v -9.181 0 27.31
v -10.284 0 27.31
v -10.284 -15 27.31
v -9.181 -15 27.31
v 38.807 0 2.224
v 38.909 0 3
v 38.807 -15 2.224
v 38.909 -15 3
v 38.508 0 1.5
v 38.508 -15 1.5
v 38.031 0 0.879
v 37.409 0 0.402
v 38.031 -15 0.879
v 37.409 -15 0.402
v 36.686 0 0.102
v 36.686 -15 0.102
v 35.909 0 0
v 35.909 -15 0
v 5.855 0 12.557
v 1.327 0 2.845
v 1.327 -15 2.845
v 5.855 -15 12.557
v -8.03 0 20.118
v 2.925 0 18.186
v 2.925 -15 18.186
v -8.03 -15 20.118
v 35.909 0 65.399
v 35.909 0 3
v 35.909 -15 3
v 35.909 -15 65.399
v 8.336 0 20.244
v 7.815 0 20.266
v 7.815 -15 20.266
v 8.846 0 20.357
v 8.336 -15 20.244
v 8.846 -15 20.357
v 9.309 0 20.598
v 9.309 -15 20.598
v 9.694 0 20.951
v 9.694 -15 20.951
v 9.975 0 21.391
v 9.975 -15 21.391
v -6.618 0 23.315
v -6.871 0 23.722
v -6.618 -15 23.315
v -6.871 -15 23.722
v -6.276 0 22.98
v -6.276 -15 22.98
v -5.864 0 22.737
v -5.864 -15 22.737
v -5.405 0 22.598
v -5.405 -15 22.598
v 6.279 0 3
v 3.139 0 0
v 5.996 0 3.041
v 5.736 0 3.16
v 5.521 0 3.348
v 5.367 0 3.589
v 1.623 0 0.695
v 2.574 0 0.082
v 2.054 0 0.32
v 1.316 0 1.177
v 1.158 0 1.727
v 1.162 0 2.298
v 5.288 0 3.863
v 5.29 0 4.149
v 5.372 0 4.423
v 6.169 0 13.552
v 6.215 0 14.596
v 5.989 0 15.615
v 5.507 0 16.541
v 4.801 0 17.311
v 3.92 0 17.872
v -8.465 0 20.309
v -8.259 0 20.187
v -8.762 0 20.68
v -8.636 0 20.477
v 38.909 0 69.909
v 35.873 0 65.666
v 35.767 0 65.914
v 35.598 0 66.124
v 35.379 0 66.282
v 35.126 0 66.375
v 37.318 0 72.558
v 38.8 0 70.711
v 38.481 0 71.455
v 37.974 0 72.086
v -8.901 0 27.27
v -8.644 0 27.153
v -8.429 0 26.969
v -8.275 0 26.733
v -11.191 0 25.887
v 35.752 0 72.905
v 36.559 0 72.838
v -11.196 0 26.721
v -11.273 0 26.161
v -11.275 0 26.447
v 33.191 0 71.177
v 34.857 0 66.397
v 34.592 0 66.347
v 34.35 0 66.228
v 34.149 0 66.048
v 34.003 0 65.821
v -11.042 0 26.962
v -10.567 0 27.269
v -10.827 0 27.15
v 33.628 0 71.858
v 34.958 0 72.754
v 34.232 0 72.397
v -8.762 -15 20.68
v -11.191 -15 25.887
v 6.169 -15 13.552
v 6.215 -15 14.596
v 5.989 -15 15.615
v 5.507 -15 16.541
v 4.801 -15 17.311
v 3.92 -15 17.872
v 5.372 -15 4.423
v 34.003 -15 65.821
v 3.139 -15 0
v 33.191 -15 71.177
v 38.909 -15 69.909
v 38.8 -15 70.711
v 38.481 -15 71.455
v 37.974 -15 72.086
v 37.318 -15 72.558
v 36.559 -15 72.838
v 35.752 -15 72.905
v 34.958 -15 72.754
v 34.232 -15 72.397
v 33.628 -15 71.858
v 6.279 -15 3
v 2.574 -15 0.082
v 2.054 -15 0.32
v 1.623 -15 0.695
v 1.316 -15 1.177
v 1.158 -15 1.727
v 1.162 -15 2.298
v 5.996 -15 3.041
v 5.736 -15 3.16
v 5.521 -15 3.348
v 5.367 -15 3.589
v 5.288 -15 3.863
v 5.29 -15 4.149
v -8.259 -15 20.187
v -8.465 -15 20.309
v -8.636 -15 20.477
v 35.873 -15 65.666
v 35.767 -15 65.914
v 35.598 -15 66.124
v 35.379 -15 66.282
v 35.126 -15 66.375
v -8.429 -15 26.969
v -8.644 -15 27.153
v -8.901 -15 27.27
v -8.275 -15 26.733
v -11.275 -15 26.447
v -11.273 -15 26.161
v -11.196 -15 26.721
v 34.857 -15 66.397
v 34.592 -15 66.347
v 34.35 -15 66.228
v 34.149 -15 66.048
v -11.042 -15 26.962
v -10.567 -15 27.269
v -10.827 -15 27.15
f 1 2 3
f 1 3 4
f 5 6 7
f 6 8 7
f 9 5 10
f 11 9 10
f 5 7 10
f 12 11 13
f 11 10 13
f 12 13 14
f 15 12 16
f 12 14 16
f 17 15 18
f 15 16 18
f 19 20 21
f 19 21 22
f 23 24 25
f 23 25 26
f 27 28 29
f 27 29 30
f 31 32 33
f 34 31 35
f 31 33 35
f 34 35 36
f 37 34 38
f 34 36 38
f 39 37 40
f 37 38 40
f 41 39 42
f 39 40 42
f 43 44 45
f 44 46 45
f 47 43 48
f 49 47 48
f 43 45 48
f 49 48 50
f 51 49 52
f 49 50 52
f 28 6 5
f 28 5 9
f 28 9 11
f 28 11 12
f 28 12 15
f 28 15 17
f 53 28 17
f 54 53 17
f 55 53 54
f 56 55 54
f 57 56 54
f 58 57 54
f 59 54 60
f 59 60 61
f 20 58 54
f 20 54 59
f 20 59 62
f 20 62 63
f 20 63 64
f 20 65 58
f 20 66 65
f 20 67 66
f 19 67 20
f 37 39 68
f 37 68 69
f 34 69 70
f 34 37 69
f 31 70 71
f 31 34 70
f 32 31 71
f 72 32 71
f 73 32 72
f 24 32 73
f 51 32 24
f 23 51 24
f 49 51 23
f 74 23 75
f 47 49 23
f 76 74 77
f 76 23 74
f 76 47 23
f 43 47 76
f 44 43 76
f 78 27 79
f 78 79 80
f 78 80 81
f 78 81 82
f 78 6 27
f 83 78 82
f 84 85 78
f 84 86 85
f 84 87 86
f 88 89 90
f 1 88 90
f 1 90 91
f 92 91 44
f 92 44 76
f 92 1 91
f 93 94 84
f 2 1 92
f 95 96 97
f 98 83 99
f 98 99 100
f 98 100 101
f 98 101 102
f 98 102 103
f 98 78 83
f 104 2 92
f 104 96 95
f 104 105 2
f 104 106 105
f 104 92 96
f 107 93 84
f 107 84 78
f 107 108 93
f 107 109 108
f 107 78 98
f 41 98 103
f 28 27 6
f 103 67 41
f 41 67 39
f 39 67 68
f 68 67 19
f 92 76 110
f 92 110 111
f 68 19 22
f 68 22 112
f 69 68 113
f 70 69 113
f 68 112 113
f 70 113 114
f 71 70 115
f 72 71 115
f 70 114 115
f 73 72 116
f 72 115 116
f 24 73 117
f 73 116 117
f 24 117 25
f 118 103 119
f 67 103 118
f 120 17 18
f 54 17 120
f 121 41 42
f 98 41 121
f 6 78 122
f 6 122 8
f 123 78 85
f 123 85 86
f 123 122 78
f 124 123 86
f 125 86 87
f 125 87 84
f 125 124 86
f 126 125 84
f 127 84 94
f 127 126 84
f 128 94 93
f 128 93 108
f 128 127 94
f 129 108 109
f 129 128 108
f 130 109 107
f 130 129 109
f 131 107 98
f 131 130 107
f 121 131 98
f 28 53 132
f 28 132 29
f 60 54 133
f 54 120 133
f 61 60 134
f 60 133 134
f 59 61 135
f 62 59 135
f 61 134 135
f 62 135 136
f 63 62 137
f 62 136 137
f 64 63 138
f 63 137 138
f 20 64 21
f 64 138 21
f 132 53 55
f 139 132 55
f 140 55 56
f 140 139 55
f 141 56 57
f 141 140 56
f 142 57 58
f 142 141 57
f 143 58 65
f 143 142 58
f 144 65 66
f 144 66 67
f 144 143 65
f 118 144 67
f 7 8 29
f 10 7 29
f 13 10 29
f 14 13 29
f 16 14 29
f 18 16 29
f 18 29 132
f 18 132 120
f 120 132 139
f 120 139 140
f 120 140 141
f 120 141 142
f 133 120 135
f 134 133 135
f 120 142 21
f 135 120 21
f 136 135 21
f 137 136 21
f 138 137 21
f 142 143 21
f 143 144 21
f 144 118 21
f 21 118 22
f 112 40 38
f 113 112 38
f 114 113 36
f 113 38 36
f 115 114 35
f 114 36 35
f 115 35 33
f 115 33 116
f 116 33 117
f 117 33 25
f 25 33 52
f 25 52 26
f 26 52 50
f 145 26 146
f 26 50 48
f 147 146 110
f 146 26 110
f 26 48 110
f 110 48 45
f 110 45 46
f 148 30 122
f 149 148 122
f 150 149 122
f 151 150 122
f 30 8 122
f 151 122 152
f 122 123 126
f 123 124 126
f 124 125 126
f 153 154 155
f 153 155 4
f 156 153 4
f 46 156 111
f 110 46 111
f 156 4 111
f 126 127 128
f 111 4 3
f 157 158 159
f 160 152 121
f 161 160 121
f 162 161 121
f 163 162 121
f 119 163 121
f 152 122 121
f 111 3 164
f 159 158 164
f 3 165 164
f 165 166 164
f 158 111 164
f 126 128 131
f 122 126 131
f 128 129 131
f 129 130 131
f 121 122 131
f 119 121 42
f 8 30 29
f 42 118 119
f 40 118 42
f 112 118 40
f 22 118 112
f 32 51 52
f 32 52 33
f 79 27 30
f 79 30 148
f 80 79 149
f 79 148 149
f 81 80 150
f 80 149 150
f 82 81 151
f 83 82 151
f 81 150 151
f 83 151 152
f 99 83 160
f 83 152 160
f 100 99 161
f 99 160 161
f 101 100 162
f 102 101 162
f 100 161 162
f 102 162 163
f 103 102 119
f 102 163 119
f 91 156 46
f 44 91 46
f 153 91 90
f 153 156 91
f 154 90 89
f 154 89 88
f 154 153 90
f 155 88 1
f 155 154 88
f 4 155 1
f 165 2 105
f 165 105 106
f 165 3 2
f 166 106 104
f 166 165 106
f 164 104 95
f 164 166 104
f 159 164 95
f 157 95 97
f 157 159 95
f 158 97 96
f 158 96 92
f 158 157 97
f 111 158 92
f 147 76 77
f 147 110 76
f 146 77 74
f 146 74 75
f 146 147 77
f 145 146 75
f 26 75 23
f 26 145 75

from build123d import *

# Parameters (mm, degrees)
PAD_DEPTH   = 15
FILLET_R    = 3
FILLET001_R = 2
FILLET002_R = 3
FILLET003_R = 1
FILLET004_R = 1
FILLET005_R = 4
FILLET006_R = 2
FILLET007_R = 1


with BuildPart() as part:
    # Sketch → Pad (new body)
    with BuildSketch(Plane.XZ):
        Polygon((38.909431, 83.441545), (38.909431, 0), (0, 0), (8.058298, 17.281077), (-8.54243, 20.208233), (-11.853996, 27.30991), (-8.543862, 27.30991), (-6.430771, 22.778371), (9.326153, 20), align=None)
        Polygon((35.909431, 69.90942), (4.709057, 3), (35.909431, 3), align=None, mode=Mode.SUBTRACT)
    extrude(amount=PAD_DEPTH)

    # Fillet
    fillet_edges = [part.edges().sort_by_distance(p)[0] for p in [
        (38.909431, -7.5, 0),
    ]]
    fillet(fillet_edges, radius=FILLET_R)

    # Fillet001
    fillet001_edges = [part.edges().sort_by_distance(p)[0] for p in [
        (0, -7.5, 0),
    ]]
    fillet(fillet001_edges, radius=FILLET001_R)

    # Fillet002
    fillet002_edges = [part.edges().sort_by_distance(p)[0] for p in [
        (38.909431, -7.5, 83.441545),
    ]]
    fillet(fillet002_edges, radius=FILLET002_R)

    # Fillet003
    fillet003_edges = [part.edges().sort_by_distance(p)[0] for p in [
        (35.909431, -7.5, 69.90942),
    ]]
    fillet(fillet003_edges, radius=FILLET003_R)

    # Fillet004
    fillet004_edges = [part.edges().sort_by_distance(p)[0] for p in [
        (4.709057, -7.5, 3),
    ]]
    fillet(fillet004_edges, radius=FILLET004_R)

    # Fillet005
    fillet005_edges = [part.edges().sort_by_distance(p)[0] for p in [
        (8.058298, -7.5, 17.281077),
    ]]
    fillet(fillet005_edges, radius=FILLET005_R)

    # Fillet006
    fillet006_edges = [part.edges().sort_by_distance(p)[0] for p in [
        (-6.430771, -7.5, 22.778371),
        (9.326153, -7.5, 20),
    ]]
    fillet(fillet006_edges, radius=FILLET006_R)

    # Fillet007
    fillet007_edges = [part.edges().sort_by_distance(p)[0] for p in [
        (-8.543862, -7.5, 27.30991),
        (-11.853996, -7.5, 27.30991),
        (-8.54243, -7.5, 20.208233),
    ]]
    fillet(fillet007_edges, radius=FILLET007_R)


solid = part.part
